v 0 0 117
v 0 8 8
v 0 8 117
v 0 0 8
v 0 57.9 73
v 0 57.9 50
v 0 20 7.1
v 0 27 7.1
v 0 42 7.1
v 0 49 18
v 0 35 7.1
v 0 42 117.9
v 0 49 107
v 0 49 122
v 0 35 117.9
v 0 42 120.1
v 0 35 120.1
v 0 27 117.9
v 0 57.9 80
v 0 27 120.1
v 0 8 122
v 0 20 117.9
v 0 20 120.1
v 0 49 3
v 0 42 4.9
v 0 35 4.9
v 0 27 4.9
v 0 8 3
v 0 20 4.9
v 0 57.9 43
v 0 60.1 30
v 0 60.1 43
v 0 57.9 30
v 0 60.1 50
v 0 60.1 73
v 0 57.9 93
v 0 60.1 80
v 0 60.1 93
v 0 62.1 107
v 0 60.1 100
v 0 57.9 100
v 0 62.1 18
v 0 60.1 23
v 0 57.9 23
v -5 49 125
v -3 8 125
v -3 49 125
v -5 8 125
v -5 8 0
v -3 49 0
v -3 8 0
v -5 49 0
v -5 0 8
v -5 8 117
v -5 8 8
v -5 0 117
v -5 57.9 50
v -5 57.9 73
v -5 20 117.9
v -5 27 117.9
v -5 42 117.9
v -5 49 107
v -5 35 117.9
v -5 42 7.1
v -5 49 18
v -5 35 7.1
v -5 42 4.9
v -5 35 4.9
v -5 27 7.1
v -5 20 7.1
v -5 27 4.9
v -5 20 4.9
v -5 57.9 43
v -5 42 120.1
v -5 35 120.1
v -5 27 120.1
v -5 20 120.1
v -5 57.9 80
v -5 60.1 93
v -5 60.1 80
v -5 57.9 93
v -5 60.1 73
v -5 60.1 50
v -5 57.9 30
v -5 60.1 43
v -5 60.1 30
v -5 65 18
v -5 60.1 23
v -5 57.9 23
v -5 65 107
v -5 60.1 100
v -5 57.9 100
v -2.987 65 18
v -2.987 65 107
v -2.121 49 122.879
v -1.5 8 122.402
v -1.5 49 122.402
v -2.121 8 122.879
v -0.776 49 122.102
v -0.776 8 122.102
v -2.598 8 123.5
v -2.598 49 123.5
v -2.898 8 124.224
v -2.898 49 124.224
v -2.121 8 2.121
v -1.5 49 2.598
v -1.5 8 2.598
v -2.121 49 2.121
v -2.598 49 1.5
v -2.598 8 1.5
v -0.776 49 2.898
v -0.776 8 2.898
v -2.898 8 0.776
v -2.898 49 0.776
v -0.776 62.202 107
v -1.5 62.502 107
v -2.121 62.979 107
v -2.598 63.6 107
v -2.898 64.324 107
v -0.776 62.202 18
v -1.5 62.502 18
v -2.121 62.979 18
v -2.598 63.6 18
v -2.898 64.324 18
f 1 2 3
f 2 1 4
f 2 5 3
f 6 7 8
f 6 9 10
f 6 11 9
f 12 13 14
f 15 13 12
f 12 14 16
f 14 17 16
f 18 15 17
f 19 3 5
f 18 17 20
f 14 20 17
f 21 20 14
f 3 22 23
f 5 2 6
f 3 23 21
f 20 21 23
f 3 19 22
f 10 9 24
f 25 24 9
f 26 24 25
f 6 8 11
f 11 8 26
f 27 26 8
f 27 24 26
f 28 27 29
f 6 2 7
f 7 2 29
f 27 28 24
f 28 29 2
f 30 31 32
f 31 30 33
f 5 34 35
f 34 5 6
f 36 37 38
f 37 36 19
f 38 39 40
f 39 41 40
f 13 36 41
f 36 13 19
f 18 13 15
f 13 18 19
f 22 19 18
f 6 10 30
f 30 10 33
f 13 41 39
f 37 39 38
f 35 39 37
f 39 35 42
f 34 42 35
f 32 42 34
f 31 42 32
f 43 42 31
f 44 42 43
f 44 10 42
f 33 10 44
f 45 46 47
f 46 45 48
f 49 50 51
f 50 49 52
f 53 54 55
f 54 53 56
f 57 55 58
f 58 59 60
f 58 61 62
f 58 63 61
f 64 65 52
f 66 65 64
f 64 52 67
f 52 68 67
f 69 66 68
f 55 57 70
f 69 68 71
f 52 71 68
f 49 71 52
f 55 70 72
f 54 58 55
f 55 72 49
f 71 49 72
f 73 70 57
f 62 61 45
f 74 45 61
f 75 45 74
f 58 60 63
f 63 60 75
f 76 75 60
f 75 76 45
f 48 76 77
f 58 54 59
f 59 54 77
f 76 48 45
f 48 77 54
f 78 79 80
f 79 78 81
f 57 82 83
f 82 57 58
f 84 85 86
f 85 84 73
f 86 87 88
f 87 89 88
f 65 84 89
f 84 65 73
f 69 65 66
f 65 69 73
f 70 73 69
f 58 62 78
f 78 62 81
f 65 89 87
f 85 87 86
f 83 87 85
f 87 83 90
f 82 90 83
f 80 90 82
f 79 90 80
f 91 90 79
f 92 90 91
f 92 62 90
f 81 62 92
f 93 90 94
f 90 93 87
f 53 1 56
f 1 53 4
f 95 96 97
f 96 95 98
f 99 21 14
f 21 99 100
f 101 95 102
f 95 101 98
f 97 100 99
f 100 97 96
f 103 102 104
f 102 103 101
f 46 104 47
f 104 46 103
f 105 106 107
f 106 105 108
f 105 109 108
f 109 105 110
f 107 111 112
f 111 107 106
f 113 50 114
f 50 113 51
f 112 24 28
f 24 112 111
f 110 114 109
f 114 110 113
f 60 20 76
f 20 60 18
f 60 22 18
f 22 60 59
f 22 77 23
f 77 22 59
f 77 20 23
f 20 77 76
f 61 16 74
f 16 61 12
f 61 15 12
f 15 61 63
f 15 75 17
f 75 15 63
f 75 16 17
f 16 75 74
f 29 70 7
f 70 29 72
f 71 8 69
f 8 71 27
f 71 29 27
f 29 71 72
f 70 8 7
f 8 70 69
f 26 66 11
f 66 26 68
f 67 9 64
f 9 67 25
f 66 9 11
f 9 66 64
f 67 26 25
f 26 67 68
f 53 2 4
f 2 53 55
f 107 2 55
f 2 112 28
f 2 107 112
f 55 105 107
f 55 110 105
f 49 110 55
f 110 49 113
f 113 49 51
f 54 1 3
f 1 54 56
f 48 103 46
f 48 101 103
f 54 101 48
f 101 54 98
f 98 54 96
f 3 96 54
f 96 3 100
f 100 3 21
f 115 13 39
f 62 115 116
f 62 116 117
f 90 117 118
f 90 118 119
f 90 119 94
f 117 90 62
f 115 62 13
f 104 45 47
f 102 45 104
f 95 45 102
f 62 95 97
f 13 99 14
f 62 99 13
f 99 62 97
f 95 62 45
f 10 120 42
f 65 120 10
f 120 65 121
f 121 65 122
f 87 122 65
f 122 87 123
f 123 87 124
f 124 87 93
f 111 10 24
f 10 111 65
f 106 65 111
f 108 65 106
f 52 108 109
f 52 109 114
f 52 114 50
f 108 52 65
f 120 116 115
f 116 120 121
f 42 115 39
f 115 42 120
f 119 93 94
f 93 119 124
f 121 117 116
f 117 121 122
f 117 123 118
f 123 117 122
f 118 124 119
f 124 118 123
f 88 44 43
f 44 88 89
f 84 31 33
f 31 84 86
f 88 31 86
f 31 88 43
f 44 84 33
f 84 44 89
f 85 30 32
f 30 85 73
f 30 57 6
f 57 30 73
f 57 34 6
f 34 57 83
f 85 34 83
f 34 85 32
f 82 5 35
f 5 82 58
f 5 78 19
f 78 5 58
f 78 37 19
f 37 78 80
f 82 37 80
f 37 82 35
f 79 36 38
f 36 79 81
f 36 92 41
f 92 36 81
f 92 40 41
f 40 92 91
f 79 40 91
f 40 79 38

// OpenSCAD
// file: ../OpenSCAD_Modules/cube_vround.scad
module cube_vround(
	size=[10,10,10],
	round_corners=[true,true,true,true],
	rounding=3,
	center_xy=false,
	center_z=false,
	attach=0,
	wall_attach=0,
	quality=2, //integer from 1 to infinity
)
{
	assert(len(size)==3);
	assert(len(round_corners)==4);
	assert(rounding>0);
	assert(rounding<=size[0]/2);
	assert(rounding<=size[1]/2);
	assert(quality>0);
	assert(attach>=0);
	assert(wall_attach>=0);
	height=size[2]+attach;
	cyl_r=rounding+wall_attach;
	cyl_mvx=size[0]/2-rounding;
	cyl_mvy=size[1]/2-rounding;
	cube_szx=size[0]/2;
	cube_szy=size[1]/2;
	cube_mvx=cube_szx/2+wall_attach;
	cube_mvy=cube_szy/2+wall_attach;
	translate([center_xy?0:cube_szx,center_xy?0:cube_szy,center_z?-attach/2:(size[2]-attach)/2])
		hull()
		{
			if(round_corners[0])
				translate([cyl_mvx,cyl_mvy])
					cylinder(r=cyl_r,h=height,$fn=12*quality,center=true);
			else
				translate([cube_mvx,cube_mvy])
					cube([cube_szx,cube_szy,height],center=true);
			if(round_corners[1])
				translate([cyl_mvx,-cyl_mvy])
					cylinder(r=cyl_r,h=height,$fn=12*quality,center=true);
			else
				translate([cube_mvx,-cube_mvy])
					cube([cube_szx,cube_szy,height],center=true);
			if(round_corners[2])
				translate([-cyl_mvx,-cyl_mvy])
					cylinder(r=cyl_r,h=height,$fn=12*quality,center=true);
			else
				translate([-cube_mvx,-cube_mvy])
					cube([cube_szx,cube_szy,height],center=true);
			if(round_corners[3])
				translate([-cyl_mvx,cyl_mvy])
					cylinder(r=cyl_r,h=height,$fn=12*quality,center=true);
			else
				translate([-cube_mvx,cube_mvy])
					cube([cube_szx,cube_szy,height],center=true);
		};
}

//example
cube_vround(round_corners=[true,false,true,false],
size=[10,20,6],
attach=0.1,
wall_attach=0.1,
rounding=3,
center_xy=true,center_z=false);
// main file
use <../OpenSCAD_Modules/cube_vround.scad>

module NylonTieCut
(
	extra_width=2,
	width=3.2,
	//lock cut
	cutHeight=7,
	cutWidth=2,
)
{
	cutClr=0.1;
	translate([-extra_width-cutClr,-cutClr,0])
		cube(size=[width+2*cutClr+extra_width, cutWidth+2*cutClr, cutHeight]);
}

module PowerPlugHolder
(
	height=65,
	width=2,
	extra_width=5,
	depth=125,
	cornerCutR=6/2,
	quality=1,
//lock cut
	cutShift=5,
	cutHeight=7,
	cutWidth=2,
)
{
	cutClr=0.1;
	difference()
	{
		//case base
		translate([-extra_width,0,0])
			cube(size=[extra_width,height,depth]);

		translate([0,-cutClr,depth])
			rotate(a=90,v=[-1,0,0])
				cylinder(h=height+2*cutClr,r=cornerCutR,$fn=24*quality);
		translate([0,-cutClr,0])
			rotate(a=90,v=[-1,0,0])
				cylinder(h=depth+2*cutClr,r=cornerCutR,$fn=24*quality);

		translate([0,20,depth-cutShift])
			rotate(a=-90,v=[1,0,0])
				NylonTieCut(extra_width=extra_width);
		translate([0,35,depth-cutShift])
			rotate(a=-90,v=[1,0,0])
				NylonTieCut(extra_width=extra_width);


		translate([0,20+7,cutShift])
			rotate(a=90,v=[1,0,0])
				NylonTieCut(extra_width=extra_width);
		translate([0,35+7,cutShift])
			rotate(a=90,v=[1,0,0])
				NylonTieCut(extra_width=extra_width);


		//corner cuts
		translate([-extra_width-cutClr,0-cutClr,-depth+8])
			cube(size=[extra_width+cutClr*2,8+cutClr,depth]);
		translate([-extra_width-cutClr,0-cutClr,depth-8])
			cube(size=[extra_width+cutClr*2,8+cutClr,depth]);
		translate([-extra_width-cutClr,height-16,depth-18])
			cube(size=[extra_width+cutClr*2,16+cutClr,depth]);
		translate([-extra_width-cutClr,height-16,-depth+18])
			cube(size=[extra_width+cutClr*2,16+cutClr,depth]);
		translate([0,height+cutClr,0])
			cylinder(h=depth+2*cutClr,r=cornerCutR,$fn=24*quality);
		
		//corner tie cuts
		translate([0,height-extra_width,30])
			rotate(a=-90,v=[1,0,0])
				rotate(a=-90,v=[1,0,0])
					NylonTieCut(extra_width=extra_width);
		translate([0,height-extra_width,50])
			rotate(a=-90,v=[1,0,0])
				rotate(a=-90,v=[1,0,0])
					NylonTieCut(extra_width=extra_width);
		translate([0,height-extra_width,80])
			rotate(a=-90,v=[1,0,0])
				rotate(a=-90,v=[1,0,0])
					NylonTieCut(extra_width=extra_width);
		translate([0,height-extra_width,100])
			rotate(a=-90,v=[1,0,0])
				rotate(a=-90,v=[1,0,0])
					NylonTieCut(extra_width=extra_width);
	}

}

PowerPlugHolder();
